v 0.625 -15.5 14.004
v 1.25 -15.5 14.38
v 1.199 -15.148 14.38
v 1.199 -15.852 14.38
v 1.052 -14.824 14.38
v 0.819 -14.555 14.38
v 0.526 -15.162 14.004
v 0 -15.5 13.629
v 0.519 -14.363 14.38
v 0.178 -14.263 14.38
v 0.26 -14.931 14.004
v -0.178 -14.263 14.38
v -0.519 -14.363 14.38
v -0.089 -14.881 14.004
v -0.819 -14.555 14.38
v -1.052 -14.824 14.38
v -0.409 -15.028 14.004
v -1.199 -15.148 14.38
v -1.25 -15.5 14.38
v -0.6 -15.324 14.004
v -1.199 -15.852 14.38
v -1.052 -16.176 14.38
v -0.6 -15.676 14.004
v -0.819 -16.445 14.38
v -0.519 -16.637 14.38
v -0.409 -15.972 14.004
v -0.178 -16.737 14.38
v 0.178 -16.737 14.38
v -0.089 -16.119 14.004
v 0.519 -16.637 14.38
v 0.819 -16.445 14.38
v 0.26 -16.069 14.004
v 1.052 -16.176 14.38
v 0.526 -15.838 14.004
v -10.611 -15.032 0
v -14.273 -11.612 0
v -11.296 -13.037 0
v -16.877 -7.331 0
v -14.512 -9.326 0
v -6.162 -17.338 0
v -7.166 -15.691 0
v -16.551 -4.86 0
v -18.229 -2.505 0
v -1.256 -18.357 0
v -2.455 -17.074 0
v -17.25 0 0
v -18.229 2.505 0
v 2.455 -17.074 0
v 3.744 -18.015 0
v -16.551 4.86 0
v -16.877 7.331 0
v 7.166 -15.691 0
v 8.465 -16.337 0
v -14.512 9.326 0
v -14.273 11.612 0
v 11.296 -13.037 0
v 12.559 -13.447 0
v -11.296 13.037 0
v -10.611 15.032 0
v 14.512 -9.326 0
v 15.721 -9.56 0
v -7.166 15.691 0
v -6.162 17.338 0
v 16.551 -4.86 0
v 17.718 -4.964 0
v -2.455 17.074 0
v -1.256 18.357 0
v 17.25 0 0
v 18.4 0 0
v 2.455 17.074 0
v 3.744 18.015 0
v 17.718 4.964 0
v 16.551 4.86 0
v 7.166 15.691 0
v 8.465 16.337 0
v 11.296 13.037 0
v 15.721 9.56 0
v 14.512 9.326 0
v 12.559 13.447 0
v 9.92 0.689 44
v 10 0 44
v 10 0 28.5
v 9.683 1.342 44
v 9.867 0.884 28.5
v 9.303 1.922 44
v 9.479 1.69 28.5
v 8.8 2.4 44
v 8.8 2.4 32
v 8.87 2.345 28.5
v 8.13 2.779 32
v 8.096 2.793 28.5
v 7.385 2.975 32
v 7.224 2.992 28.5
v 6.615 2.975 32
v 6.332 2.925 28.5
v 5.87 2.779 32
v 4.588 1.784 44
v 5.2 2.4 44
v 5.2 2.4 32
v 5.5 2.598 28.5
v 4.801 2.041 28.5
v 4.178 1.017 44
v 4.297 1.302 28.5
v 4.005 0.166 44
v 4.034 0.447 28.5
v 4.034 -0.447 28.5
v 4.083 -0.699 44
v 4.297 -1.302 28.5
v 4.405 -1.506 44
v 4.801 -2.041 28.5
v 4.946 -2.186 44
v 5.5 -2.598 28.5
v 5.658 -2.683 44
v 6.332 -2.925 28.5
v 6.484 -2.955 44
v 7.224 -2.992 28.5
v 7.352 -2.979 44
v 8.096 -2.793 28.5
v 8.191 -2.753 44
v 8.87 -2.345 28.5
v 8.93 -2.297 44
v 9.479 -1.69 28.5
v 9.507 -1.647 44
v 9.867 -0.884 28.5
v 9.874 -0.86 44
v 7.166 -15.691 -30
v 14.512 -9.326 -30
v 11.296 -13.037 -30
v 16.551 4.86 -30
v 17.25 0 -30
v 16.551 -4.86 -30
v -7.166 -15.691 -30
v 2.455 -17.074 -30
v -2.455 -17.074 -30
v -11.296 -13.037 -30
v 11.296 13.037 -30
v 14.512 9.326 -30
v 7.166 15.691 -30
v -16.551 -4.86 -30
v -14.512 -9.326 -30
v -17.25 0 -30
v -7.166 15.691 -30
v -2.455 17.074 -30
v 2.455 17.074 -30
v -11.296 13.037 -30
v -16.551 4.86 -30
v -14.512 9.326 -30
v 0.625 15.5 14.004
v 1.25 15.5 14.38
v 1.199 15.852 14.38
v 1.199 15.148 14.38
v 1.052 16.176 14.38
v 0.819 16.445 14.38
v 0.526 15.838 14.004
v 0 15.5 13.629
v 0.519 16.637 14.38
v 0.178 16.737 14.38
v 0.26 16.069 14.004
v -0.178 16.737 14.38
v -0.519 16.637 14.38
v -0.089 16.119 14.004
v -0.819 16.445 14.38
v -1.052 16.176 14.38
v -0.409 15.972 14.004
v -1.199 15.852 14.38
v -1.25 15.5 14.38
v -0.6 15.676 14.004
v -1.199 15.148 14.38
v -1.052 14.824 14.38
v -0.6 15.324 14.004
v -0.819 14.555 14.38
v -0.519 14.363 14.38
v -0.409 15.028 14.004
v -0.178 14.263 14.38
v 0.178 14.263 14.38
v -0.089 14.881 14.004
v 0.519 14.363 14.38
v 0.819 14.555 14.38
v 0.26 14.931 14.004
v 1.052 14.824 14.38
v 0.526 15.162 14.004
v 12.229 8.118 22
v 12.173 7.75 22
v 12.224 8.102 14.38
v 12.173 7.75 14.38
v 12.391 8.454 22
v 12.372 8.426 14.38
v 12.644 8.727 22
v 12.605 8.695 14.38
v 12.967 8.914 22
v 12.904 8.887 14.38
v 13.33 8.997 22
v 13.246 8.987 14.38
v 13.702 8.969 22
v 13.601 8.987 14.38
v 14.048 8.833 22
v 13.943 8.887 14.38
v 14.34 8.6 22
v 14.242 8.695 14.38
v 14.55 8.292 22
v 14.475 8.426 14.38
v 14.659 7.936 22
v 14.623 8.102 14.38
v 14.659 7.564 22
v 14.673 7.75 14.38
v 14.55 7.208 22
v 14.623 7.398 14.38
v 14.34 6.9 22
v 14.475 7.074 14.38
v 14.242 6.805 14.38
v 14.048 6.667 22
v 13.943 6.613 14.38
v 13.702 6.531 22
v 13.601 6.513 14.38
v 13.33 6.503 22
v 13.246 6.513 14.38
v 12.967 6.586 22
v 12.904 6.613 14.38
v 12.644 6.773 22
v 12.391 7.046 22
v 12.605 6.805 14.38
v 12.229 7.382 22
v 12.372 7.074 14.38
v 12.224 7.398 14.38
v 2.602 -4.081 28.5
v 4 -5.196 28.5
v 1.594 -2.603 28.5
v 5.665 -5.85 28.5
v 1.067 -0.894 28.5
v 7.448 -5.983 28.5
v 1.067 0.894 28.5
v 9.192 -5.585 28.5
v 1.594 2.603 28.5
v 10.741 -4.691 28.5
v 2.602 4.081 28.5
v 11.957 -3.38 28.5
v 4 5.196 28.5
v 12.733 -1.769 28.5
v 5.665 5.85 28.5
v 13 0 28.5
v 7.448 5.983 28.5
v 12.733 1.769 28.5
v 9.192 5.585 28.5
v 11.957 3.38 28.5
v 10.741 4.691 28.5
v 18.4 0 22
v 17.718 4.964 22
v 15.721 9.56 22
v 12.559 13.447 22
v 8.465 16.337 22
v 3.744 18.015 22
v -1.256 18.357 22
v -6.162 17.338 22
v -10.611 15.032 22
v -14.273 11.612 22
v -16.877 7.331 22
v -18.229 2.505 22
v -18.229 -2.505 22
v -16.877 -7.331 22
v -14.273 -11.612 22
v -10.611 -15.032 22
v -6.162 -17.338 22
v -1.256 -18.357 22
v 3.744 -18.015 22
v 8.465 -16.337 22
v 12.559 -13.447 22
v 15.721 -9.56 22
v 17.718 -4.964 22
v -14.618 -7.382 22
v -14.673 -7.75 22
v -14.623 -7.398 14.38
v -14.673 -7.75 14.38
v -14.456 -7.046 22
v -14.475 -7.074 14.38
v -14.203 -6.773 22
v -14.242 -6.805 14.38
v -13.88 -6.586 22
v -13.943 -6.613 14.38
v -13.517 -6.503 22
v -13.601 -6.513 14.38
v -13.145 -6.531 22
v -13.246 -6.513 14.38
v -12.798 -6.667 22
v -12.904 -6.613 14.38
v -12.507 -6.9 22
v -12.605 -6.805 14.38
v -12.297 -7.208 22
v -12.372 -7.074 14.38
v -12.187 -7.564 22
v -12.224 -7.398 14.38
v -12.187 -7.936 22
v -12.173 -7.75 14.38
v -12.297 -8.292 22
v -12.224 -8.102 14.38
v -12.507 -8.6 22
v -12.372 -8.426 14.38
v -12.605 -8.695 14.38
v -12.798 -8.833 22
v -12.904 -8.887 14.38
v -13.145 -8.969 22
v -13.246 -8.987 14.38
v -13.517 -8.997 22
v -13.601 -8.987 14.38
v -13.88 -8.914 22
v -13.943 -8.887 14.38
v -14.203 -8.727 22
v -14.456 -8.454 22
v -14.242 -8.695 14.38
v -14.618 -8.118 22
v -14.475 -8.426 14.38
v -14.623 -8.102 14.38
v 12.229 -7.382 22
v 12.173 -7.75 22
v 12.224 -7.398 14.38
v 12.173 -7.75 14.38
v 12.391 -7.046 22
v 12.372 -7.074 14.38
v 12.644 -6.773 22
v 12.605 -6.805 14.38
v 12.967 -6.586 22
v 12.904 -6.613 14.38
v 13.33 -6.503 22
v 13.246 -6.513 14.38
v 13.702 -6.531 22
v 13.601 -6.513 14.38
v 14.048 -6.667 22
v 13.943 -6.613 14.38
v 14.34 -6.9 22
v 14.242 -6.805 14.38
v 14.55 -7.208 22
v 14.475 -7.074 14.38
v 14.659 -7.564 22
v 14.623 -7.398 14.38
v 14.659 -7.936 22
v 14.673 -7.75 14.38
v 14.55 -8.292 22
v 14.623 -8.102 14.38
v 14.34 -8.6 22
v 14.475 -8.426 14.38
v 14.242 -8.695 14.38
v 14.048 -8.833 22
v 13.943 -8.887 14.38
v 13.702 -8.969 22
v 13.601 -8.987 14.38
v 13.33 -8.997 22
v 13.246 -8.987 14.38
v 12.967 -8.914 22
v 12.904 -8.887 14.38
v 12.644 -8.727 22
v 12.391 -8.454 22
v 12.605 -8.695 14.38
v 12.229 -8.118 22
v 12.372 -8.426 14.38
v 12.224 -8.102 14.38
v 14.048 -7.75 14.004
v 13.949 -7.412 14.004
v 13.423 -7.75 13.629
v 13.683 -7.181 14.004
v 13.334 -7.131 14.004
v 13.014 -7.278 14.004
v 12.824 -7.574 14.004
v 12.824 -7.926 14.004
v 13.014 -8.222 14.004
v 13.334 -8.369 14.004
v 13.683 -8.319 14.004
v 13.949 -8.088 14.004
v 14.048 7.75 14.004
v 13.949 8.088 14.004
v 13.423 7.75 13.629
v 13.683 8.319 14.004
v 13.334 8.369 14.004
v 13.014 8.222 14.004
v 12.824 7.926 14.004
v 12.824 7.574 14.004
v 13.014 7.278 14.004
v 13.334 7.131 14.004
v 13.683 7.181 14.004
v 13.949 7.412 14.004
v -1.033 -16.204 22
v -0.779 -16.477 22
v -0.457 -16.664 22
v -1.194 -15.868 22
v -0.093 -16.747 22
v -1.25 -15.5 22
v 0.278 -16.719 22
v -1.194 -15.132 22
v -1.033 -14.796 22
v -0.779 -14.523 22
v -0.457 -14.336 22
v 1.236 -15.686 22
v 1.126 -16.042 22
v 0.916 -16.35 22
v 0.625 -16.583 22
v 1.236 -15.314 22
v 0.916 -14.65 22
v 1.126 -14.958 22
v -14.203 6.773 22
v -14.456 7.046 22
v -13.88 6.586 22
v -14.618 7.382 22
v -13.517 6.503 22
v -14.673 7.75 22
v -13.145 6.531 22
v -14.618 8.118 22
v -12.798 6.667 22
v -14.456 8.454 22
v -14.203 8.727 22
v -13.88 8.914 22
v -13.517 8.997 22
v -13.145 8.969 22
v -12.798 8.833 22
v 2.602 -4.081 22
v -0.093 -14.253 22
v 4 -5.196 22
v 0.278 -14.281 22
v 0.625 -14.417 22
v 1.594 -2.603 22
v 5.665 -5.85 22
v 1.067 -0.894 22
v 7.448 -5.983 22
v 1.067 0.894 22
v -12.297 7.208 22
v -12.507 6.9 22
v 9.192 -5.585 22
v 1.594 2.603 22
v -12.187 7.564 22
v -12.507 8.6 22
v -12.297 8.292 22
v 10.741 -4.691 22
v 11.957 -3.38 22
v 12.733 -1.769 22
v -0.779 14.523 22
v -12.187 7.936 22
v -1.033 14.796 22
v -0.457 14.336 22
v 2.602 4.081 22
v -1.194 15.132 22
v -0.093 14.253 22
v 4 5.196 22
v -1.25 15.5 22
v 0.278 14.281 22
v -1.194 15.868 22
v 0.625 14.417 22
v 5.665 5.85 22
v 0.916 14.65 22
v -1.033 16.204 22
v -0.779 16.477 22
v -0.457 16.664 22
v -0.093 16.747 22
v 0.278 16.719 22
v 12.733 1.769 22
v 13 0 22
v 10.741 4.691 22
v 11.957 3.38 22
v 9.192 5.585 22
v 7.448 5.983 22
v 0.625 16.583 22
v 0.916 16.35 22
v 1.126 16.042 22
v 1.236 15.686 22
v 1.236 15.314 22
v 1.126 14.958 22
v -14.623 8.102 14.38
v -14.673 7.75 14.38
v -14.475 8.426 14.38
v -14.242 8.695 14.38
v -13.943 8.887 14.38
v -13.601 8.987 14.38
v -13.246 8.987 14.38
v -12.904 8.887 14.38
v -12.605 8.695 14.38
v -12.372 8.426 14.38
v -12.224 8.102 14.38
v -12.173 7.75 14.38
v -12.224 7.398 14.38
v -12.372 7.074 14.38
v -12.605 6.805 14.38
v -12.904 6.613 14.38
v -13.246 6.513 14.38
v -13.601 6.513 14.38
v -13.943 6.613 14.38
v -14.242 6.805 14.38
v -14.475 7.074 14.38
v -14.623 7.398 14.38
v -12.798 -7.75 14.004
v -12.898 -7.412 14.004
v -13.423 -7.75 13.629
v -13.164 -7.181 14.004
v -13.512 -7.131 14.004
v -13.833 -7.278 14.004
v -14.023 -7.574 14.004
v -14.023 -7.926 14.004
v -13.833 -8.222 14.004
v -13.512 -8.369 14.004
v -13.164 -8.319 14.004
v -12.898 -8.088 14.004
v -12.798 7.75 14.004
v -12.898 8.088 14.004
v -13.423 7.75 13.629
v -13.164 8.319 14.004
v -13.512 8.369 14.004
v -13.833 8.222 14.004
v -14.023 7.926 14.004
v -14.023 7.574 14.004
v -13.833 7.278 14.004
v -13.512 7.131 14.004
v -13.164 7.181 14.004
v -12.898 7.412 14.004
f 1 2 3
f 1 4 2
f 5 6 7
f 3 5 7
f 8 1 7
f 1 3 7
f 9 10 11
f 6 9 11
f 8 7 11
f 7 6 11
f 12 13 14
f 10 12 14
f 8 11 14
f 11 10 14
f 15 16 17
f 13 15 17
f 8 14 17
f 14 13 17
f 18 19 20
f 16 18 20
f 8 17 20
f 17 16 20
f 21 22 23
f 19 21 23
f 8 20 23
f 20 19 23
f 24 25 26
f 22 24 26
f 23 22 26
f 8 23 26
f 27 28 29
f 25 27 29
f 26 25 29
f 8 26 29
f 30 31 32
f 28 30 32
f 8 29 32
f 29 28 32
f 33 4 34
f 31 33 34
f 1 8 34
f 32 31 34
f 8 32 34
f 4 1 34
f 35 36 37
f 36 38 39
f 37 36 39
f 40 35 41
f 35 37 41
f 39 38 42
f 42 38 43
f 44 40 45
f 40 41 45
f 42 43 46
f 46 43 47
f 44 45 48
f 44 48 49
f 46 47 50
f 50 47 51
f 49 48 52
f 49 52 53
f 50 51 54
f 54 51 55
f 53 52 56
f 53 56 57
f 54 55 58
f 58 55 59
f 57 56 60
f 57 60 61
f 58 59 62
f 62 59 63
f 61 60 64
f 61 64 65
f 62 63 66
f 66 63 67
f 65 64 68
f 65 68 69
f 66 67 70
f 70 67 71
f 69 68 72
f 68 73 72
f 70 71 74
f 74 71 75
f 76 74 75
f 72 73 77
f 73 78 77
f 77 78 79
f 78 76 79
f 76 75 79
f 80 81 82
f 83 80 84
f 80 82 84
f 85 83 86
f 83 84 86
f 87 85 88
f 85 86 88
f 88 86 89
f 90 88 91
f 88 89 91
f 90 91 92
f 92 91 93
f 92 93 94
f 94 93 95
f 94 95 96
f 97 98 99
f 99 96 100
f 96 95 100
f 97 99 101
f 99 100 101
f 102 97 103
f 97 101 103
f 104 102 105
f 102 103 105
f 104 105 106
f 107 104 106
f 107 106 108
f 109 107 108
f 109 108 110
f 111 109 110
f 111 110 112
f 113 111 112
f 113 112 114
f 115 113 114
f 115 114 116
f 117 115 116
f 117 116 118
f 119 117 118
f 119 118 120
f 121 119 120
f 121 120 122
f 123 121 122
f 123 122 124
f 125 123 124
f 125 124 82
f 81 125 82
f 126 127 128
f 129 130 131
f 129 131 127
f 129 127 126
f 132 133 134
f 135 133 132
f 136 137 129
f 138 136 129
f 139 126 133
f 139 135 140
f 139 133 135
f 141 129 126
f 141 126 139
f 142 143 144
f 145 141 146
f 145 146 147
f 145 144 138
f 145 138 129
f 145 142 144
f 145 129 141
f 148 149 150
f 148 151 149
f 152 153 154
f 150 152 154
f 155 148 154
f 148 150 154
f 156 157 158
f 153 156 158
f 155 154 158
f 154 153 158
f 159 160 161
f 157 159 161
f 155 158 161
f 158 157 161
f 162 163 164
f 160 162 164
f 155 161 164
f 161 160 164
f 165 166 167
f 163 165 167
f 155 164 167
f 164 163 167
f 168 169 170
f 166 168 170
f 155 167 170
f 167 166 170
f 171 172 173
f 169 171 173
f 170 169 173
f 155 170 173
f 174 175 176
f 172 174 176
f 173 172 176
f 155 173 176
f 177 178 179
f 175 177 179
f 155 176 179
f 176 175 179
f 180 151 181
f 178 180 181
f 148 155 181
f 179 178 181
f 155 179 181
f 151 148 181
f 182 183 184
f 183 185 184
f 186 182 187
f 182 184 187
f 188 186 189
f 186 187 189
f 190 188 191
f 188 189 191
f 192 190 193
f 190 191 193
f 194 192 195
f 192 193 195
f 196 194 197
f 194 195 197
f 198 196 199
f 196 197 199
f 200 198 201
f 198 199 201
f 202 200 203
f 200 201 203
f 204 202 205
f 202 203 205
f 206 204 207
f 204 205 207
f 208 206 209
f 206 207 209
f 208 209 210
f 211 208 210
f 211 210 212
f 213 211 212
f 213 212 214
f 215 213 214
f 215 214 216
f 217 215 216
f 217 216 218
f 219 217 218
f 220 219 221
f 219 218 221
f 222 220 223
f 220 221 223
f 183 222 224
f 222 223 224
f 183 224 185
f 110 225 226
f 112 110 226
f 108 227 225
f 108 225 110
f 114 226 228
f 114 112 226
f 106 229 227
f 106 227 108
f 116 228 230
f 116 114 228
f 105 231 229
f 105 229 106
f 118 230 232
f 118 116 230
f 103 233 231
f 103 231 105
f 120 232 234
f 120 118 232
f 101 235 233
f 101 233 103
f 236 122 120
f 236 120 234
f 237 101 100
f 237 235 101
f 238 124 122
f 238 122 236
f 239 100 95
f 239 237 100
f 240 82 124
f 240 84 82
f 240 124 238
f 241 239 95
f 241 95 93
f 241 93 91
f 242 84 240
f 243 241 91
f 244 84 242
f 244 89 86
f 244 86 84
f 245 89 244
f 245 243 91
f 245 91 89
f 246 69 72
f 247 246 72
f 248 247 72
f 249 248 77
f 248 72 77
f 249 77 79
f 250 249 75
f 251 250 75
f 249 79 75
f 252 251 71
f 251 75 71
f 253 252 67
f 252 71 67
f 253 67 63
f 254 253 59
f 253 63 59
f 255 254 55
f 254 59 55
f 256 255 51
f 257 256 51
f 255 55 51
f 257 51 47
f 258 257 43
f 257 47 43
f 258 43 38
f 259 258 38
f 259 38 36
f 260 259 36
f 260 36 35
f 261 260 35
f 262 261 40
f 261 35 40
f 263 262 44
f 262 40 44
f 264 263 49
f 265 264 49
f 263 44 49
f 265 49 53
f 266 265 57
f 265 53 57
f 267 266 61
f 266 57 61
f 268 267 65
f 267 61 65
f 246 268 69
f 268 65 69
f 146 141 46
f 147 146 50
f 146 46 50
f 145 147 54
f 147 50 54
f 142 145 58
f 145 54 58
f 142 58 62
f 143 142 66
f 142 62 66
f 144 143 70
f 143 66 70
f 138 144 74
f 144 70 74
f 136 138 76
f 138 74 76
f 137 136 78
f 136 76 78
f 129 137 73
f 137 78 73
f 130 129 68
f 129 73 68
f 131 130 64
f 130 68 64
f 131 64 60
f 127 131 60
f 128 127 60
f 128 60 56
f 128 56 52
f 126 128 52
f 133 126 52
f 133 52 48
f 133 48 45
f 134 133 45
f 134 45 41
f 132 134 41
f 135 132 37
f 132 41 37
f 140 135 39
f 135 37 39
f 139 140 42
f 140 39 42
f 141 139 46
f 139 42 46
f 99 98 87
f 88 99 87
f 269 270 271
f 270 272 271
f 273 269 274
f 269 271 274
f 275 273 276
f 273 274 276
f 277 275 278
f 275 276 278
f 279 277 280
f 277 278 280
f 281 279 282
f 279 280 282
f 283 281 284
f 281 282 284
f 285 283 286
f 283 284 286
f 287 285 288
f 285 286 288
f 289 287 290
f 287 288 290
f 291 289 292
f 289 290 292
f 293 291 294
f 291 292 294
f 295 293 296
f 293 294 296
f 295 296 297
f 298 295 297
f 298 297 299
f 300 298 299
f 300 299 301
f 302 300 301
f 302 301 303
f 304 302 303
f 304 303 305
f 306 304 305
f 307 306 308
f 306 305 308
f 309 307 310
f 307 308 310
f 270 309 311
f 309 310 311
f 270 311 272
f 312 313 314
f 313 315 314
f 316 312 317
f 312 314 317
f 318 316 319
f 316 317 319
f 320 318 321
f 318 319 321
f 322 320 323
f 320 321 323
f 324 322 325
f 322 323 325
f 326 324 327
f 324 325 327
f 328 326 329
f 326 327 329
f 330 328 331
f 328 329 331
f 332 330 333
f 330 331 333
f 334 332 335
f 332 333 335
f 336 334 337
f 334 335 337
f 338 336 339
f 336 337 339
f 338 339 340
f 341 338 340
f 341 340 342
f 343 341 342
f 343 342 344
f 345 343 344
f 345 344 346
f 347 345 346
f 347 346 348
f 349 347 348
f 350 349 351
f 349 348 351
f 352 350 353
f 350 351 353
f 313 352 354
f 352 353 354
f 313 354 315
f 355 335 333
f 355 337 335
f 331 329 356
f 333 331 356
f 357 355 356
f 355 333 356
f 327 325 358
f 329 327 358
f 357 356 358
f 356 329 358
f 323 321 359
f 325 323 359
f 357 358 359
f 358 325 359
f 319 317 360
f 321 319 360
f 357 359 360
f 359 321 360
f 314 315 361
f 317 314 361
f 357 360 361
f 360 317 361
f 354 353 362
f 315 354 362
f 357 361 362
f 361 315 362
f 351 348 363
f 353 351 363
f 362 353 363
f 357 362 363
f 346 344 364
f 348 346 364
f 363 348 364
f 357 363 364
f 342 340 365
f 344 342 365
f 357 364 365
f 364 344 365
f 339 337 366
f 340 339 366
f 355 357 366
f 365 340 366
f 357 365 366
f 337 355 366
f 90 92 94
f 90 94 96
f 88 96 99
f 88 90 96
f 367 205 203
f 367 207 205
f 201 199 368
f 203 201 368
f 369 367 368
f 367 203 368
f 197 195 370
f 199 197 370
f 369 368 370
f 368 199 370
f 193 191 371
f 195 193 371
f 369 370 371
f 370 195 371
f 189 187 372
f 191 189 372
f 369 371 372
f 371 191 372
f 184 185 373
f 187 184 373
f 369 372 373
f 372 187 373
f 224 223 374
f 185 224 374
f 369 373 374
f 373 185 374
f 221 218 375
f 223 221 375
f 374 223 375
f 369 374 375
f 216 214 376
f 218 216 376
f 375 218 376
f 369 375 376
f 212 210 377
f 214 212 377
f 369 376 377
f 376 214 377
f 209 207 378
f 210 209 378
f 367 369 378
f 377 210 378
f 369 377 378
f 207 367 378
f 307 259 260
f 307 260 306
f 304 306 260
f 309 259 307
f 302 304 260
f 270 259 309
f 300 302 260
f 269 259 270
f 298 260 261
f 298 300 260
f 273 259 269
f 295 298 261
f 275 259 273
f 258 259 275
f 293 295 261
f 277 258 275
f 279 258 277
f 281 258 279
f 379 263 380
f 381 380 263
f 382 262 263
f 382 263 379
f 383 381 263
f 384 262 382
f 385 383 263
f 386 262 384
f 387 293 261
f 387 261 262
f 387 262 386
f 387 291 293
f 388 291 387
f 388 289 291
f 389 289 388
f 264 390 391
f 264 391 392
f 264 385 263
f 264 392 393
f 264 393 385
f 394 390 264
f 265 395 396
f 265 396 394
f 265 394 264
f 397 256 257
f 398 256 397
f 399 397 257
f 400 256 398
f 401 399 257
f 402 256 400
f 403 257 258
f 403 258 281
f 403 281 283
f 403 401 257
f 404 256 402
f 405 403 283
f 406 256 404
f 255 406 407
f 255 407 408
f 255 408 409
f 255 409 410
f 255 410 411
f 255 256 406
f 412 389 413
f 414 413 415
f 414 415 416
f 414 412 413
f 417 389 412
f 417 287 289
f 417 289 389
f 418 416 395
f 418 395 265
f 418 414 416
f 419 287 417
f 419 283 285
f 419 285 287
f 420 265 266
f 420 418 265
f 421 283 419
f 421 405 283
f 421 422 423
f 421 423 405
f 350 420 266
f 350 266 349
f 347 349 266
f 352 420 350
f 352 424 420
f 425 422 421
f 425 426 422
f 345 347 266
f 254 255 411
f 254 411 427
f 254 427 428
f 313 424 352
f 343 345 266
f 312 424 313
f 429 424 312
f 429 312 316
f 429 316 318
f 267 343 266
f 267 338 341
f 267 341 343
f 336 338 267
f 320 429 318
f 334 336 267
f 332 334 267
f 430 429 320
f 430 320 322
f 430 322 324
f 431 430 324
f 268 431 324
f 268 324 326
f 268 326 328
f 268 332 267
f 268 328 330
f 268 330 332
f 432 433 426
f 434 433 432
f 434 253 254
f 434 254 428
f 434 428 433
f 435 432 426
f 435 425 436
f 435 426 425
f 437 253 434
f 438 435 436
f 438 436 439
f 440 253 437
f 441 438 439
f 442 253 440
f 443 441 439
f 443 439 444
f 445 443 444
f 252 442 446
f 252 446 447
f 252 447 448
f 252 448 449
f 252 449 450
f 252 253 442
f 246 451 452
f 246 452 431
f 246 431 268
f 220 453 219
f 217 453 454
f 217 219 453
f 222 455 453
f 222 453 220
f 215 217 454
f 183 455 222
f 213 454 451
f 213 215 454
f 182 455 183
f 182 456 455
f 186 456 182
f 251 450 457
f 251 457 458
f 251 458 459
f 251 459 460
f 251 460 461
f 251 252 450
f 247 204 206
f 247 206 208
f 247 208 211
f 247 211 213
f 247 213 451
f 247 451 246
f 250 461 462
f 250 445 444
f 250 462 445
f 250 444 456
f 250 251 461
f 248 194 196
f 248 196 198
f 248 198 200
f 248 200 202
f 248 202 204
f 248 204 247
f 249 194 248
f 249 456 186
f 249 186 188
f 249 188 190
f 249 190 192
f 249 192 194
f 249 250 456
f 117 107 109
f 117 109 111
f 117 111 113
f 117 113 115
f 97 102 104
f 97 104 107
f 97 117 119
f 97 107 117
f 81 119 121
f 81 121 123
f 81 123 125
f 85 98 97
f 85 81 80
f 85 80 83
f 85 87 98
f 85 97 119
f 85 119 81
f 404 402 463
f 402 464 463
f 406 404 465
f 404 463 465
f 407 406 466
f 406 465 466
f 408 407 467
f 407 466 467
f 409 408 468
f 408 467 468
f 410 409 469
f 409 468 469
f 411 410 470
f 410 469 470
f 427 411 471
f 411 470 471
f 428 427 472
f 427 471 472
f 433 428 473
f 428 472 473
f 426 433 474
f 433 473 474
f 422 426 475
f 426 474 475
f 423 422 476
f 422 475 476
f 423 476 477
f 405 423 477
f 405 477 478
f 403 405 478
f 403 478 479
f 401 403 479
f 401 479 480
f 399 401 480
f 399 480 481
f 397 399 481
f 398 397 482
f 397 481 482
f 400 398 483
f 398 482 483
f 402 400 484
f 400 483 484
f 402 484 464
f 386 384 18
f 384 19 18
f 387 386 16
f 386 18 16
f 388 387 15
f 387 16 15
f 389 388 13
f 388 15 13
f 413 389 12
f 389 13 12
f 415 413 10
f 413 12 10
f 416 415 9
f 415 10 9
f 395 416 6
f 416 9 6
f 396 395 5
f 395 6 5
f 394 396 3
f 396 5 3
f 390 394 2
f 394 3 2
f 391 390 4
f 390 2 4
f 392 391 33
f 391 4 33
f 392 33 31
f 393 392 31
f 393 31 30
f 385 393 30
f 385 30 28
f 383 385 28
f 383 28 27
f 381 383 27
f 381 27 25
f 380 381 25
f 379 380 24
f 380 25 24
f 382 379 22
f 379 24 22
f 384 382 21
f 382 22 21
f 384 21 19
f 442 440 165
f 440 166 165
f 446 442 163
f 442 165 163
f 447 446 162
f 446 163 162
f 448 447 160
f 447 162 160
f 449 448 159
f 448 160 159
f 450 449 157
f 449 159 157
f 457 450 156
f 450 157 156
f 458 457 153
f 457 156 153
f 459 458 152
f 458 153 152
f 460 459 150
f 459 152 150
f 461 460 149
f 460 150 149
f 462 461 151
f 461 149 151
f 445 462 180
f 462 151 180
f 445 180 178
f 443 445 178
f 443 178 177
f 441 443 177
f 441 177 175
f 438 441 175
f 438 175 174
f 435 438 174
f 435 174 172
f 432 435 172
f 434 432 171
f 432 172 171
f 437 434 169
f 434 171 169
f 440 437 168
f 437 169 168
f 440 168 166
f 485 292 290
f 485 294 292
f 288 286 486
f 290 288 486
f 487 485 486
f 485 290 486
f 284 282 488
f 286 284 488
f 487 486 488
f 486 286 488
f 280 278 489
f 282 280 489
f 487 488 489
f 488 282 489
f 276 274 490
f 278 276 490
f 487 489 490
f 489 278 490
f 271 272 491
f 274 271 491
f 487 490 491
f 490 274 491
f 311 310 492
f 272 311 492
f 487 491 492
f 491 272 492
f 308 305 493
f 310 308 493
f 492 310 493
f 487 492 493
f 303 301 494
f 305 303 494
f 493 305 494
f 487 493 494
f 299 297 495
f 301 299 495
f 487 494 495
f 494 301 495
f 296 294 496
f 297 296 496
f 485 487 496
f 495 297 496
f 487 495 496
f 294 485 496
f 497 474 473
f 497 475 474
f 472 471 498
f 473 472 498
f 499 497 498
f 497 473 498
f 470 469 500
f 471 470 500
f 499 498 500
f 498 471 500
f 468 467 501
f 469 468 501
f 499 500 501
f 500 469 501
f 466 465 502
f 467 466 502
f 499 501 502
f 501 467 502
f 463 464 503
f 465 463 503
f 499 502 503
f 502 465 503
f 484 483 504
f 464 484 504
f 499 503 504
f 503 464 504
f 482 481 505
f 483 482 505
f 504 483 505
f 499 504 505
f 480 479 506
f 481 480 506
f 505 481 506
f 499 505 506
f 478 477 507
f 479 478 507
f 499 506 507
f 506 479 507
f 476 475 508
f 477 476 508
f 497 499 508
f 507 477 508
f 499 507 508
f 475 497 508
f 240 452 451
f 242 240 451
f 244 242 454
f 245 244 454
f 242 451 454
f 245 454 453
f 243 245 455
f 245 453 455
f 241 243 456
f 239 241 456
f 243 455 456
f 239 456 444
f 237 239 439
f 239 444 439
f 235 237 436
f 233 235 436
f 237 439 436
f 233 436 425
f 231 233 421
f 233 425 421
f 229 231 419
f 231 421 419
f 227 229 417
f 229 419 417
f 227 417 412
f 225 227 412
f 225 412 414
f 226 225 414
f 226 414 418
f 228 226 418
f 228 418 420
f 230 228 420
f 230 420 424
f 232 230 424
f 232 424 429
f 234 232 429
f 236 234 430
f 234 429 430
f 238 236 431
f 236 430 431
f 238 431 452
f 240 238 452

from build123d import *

# Parameters (mm, degrees)
SKETCH1_R                 = 18.4
BOSS_EXTRUDE1_DEPTH       = 22
M3X0_5_TAPPED_HOLE1_D     = 2.5
M3X0_5_TAPPED_HOLE1_DEPTH = 7.62
M3X0_5_TAPPED_HOLE1_TIP   = 0.751075774
SKETCH6_R                 = 17.25
BOSS_EXTRUDE2_DEPTH       = 30
SKETCH7_R                 = 3
BOSS_EXTRUDE3_DEPTH       = 22
CUT_EXTRUDE1_DEPTH        = 12
SKETCH9_R                 = 6
BOSS_EXTRUDE4_DEPTH       = 6.5


with BuildPart() as part:
    # Sketch1 → Boss-Extrude1 (new body)
    with BuildSketch(Plane.XY):
        Circle(SKETCH1_R)
    extrude(amount=BOSS_EXTRUDE1_DEPTH)

    # M3x0.5 Tapped Hole1
    with Locations(Plane.XY.offset(22)):
        with Locations((-13.423393759, 7.75), (0, 15.5), (13.423393759, 7.75), (13.423393759, -7.75), (0, -15.5), (-13.423393759, -7.75)):
            Hole(M3X0_5_TAPPED_HOLE1_D / 2, depth=M3X0_5_TAPPED_HOLE1_DEPTH)
            with Locations((0, 0, -(M3X0_5_TAPPED_HOLE1_DEPTH + M3X0_5_TAPPED_HOLE1_TIP / 2))):  # 118° drill point
                Cone(0, M3X0_5_TAPPED_HOLE1_D / 2, M3X0_5_TAPPED_HOLE1_TIP, mode=Mode.SUBTRACT)

    # Sketch6 → Boss-Extrude2 (add)
    with BuildSketch(Plane(origin=(0, 0, 0), x_dir=(-1, 0, 0), z_dir=(0, 0, -1))):
        Circle(SKETCH6_R)
    extrude(amount=BOSS_EXTRUDE2_DEPTH)

    # Sketch7 → Boss-Extrude3 (add)
    with BuildSketch(Plane.XY.offset(22)):
        with Locations((7, 0)):
            Circle(SKETCH7_R)
    extrude(amount=BOSS_EXTRUDE3_DEPTH)

    # Sketch8 → Cut-Extrude1 (cut)
    with BuildSketch(Plane.XY.offset(44)):
        with BuildLine():
            Line((5.2, 2.4), (8.8, 2.4))
            ThreePointArc((8.8, 2.4), (7, 3), (5.2, 2.4))
        make_face()
    extrude(amount=-CUT_EXTRUDE1_DEPTH, mode=Mode.SUBTRACT)

    # Sketch9 → Boss-Extrude4 (add)
    with BuildSketch(Plane.XY.offset(22)):
        with Locations((7, 0)):
            Circle(SKETCH9_R)
    extrude(amount=BOSS_EXTRUDE4_DEPTH)


solid = part.part
